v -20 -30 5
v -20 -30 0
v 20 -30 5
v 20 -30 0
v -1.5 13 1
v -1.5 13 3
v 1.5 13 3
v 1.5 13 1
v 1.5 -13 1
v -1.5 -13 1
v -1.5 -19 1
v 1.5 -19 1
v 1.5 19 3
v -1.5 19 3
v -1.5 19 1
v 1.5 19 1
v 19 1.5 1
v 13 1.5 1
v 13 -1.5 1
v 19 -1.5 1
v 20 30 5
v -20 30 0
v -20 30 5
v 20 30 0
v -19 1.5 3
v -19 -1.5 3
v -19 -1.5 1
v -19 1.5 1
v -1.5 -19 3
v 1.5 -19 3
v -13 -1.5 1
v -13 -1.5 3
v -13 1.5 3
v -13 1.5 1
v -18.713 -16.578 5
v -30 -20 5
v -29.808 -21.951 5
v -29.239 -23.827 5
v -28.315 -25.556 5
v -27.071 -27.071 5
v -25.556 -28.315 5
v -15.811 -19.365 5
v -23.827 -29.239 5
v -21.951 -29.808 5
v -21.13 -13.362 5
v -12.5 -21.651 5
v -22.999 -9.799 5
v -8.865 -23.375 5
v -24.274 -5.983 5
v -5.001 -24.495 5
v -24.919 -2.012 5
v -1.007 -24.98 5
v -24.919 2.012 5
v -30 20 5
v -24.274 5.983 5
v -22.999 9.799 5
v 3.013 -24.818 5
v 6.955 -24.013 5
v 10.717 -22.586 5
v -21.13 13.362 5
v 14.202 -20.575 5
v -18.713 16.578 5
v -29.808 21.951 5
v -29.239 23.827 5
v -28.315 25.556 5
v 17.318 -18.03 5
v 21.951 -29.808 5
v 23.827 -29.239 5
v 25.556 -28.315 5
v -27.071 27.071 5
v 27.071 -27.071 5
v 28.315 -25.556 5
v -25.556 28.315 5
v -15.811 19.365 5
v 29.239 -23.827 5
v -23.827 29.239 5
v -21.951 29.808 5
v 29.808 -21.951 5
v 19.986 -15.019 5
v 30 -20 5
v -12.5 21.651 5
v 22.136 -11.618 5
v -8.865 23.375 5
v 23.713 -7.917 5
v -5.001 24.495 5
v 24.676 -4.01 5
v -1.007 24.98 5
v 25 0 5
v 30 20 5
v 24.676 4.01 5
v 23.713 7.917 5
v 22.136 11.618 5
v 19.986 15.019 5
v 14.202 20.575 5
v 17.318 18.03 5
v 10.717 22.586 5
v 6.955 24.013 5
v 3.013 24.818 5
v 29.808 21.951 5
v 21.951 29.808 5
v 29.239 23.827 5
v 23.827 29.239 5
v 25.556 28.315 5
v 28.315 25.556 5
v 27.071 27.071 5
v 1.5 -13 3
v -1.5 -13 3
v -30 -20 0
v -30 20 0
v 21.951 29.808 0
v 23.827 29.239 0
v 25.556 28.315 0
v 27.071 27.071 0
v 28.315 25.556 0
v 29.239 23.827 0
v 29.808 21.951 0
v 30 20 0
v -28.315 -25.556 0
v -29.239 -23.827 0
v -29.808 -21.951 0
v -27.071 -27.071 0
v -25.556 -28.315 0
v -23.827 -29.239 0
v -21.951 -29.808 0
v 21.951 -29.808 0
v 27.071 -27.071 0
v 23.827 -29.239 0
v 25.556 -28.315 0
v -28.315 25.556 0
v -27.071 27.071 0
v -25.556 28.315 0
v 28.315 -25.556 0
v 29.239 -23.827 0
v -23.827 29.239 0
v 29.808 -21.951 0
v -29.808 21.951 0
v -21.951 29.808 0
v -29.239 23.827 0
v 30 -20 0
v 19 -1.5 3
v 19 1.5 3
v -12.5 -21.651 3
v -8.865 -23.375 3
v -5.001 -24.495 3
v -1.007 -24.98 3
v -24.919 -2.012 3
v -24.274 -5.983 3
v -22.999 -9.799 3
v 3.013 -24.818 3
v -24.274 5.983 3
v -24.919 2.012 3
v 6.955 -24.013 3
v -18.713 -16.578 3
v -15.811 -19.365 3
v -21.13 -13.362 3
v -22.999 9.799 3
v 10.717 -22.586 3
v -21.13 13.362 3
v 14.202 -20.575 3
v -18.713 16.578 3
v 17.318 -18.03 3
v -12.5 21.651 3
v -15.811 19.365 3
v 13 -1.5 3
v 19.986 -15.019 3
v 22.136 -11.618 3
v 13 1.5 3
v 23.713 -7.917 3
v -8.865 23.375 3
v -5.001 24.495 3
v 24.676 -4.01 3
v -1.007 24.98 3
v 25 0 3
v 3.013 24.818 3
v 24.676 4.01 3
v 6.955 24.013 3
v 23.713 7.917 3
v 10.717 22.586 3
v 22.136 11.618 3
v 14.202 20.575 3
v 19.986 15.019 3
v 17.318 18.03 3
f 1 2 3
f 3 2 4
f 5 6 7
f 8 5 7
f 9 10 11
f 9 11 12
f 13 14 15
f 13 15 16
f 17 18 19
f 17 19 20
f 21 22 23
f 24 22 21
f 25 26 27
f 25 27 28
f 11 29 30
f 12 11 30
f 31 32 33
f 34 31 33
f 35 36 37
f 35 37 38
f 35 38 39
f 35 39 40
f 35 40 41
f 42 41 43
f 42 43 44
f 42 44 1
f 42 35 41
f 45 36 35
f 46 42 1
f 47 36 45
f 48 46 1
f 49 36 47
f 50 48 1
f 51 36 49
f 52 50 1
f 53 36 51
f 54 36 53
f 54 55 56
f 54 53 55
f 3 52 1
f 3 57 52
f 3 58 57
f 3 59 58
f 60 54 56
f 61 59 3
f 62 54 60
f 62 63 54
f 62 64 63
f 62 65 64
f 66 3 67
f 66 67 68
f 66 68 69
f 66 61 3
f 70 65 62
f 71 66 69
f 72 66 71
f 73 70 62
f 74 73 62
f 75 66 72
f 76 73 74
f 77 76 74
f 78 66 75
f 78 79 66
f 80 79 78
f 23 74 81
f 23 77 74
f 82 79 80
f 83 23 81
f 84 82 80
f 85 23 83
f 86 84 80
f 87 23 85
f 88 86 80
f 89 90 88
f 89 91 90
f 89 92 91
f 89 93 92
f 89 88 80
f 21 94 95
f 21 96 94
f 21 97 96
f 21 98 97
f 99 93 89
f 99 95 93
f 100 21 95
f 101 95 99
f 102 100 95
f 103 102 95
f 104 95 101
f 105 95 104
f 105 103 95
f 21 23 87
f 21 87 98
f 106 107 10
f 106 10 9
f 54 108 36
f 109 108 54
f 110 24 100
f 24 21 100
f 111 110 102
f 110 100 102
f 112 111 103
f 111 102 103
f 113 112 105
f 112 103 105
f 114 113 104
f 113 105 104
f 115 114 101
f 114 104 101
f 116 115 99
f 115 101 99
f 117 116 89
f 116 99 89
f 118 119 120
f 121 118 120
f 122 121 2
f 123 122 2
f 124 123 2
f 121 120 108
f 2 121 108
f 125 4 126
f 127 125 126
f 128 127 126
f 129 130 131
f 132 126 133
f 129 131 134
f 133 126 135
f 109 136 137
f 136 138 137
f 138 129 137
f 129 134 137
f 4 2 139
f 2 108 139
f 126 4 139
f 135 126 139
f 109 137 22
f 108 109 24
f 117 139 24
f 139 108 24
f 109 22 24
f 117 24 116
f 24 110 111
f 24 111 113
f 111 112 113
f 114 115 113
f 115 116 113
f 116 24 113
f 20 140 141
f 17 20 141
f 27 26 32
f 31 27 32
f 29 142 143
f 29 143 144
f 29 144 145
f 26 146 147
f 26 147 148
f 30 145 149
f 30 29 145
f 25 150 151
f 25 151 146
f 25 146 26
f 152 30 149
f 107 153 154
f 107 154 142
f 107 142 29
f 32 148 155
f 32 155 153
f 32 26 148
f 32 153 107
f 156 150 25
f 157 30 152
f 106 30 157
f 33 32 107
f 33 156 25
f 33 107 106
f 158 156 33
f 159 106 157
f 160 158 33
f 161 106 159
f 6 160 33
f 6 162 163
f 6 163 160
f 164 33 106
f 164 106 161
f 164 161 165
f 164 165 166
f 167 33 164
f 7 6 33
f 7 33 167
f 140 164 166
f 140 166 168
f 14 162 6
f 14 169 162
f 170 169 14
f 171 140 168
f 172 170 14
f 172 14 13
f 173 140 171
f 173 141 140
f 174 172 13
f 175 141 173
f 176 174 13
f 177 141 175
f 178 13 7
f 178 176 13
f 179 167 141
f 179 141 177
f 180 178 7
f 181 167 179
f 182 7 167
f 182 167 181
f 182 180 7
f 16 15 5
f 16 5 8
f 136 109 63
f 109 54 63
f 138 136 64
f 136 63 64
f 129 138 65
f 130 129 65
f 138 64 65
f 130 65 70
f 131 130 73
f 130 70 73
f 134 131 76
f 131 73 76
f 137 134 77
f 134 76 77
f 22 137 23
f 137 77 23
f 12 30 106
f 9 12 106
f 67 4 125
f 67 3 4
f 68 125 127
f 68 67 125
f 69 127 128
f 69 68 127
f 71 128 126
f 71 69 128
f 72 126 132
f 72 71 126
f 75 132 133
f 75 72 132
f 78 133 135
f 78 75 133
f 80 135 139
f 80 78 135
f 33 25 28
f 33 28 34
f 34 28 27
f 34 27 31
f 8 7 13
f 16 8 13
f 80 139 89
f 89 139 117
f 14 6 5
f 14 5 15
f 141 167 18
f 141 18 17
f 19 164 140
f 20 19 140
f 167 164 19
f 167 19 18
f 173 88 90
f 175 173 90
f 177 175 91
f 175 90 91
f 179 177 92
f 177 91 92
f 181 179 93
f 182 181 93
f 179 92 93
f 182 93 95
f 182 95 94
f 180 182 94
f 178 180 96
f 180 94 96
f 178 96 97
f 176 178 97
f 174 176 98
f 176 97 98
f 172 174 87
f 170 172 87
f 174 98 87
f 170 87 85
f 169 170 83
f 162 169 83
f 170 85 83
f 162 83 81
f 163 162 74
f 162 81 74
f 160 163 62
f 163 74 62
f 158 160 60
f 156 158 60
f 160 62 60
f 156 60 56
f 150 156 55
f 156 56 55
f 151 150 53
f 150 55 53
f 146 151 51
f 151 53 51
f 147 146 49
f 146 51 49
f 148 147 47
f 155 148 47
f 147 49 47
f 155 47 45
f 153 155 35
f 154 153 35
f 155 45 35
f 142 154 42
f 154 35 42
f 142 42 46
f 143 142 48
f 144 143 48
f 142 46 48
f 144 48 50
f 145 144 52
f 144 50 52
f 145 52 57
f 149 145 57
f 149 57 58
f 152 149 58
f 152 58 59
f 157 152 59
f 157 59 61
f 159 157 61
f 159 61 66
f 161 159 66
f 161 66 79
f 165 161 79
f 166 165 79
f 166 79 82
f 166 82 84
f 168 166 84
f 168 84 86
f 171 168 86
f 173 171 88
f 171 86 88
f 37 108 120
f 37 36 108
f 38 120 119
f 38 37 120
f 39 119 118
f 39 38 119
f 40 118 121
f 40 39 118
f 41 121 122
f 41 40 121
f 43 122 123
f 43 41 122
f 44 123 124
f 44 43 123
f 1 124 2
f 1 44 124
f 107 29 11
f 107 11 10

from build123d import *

# Parameters (mm, degrees)
F0_W     = 60
F0_H     = 60
F1_DEPTH = 5
F2_R     = 25
F3_DEPTH = 2
F4_R     = 10
F5_W     = 6
F5_H     = 3
F5_W_2   = 3
F5_H_2   = 6
F6_DEPTH = 2


with BuildPart() as f1:
    # F0 (on Top) → F1 (new body)
    with BuildSketch(Plane.XY):
        Rectangle(F0_W, F0_H)
    extrude(amount=F1_DEPTH)

    # F2 (on face) → F3 (cut)
    with BuildSketch(Plane.XY.offset(5)):
        Circle(F2_R)
    extrude(amount=-F3_DEPTH, mode=Mode.SUBTRACT)

    # F4
    f4_edges = [f1.edges().sort_by_distance(p)[0] for p in [
        (30, -30, 2.5),
        (30, 30, 2.5),
        (-30, 30, 2.5),
        (-30, -30, 2.5),
    ]]
    fillet(f4_edges, radius=F4_R)

    # F5 (on face) → F6 (cut)
    with BuildSketch(Plane.XY.offset(3)):
        with Locations((-16, 0)):
            Rectangle(F5_W, F5_H)
        with Locations((0, 16)):
            Rectangle(F5_W_2, F5_H_2)
        with Locations((16, 0)):
            Rectangle(F5_W, F5_H)
        with Locations((0, -16)):
            Rectangle(F5_W_2, F5_H_2)
    extrude(amount=-F6_DEPTH, mode=Mode.SUBTRACT)


solid = f1.part
